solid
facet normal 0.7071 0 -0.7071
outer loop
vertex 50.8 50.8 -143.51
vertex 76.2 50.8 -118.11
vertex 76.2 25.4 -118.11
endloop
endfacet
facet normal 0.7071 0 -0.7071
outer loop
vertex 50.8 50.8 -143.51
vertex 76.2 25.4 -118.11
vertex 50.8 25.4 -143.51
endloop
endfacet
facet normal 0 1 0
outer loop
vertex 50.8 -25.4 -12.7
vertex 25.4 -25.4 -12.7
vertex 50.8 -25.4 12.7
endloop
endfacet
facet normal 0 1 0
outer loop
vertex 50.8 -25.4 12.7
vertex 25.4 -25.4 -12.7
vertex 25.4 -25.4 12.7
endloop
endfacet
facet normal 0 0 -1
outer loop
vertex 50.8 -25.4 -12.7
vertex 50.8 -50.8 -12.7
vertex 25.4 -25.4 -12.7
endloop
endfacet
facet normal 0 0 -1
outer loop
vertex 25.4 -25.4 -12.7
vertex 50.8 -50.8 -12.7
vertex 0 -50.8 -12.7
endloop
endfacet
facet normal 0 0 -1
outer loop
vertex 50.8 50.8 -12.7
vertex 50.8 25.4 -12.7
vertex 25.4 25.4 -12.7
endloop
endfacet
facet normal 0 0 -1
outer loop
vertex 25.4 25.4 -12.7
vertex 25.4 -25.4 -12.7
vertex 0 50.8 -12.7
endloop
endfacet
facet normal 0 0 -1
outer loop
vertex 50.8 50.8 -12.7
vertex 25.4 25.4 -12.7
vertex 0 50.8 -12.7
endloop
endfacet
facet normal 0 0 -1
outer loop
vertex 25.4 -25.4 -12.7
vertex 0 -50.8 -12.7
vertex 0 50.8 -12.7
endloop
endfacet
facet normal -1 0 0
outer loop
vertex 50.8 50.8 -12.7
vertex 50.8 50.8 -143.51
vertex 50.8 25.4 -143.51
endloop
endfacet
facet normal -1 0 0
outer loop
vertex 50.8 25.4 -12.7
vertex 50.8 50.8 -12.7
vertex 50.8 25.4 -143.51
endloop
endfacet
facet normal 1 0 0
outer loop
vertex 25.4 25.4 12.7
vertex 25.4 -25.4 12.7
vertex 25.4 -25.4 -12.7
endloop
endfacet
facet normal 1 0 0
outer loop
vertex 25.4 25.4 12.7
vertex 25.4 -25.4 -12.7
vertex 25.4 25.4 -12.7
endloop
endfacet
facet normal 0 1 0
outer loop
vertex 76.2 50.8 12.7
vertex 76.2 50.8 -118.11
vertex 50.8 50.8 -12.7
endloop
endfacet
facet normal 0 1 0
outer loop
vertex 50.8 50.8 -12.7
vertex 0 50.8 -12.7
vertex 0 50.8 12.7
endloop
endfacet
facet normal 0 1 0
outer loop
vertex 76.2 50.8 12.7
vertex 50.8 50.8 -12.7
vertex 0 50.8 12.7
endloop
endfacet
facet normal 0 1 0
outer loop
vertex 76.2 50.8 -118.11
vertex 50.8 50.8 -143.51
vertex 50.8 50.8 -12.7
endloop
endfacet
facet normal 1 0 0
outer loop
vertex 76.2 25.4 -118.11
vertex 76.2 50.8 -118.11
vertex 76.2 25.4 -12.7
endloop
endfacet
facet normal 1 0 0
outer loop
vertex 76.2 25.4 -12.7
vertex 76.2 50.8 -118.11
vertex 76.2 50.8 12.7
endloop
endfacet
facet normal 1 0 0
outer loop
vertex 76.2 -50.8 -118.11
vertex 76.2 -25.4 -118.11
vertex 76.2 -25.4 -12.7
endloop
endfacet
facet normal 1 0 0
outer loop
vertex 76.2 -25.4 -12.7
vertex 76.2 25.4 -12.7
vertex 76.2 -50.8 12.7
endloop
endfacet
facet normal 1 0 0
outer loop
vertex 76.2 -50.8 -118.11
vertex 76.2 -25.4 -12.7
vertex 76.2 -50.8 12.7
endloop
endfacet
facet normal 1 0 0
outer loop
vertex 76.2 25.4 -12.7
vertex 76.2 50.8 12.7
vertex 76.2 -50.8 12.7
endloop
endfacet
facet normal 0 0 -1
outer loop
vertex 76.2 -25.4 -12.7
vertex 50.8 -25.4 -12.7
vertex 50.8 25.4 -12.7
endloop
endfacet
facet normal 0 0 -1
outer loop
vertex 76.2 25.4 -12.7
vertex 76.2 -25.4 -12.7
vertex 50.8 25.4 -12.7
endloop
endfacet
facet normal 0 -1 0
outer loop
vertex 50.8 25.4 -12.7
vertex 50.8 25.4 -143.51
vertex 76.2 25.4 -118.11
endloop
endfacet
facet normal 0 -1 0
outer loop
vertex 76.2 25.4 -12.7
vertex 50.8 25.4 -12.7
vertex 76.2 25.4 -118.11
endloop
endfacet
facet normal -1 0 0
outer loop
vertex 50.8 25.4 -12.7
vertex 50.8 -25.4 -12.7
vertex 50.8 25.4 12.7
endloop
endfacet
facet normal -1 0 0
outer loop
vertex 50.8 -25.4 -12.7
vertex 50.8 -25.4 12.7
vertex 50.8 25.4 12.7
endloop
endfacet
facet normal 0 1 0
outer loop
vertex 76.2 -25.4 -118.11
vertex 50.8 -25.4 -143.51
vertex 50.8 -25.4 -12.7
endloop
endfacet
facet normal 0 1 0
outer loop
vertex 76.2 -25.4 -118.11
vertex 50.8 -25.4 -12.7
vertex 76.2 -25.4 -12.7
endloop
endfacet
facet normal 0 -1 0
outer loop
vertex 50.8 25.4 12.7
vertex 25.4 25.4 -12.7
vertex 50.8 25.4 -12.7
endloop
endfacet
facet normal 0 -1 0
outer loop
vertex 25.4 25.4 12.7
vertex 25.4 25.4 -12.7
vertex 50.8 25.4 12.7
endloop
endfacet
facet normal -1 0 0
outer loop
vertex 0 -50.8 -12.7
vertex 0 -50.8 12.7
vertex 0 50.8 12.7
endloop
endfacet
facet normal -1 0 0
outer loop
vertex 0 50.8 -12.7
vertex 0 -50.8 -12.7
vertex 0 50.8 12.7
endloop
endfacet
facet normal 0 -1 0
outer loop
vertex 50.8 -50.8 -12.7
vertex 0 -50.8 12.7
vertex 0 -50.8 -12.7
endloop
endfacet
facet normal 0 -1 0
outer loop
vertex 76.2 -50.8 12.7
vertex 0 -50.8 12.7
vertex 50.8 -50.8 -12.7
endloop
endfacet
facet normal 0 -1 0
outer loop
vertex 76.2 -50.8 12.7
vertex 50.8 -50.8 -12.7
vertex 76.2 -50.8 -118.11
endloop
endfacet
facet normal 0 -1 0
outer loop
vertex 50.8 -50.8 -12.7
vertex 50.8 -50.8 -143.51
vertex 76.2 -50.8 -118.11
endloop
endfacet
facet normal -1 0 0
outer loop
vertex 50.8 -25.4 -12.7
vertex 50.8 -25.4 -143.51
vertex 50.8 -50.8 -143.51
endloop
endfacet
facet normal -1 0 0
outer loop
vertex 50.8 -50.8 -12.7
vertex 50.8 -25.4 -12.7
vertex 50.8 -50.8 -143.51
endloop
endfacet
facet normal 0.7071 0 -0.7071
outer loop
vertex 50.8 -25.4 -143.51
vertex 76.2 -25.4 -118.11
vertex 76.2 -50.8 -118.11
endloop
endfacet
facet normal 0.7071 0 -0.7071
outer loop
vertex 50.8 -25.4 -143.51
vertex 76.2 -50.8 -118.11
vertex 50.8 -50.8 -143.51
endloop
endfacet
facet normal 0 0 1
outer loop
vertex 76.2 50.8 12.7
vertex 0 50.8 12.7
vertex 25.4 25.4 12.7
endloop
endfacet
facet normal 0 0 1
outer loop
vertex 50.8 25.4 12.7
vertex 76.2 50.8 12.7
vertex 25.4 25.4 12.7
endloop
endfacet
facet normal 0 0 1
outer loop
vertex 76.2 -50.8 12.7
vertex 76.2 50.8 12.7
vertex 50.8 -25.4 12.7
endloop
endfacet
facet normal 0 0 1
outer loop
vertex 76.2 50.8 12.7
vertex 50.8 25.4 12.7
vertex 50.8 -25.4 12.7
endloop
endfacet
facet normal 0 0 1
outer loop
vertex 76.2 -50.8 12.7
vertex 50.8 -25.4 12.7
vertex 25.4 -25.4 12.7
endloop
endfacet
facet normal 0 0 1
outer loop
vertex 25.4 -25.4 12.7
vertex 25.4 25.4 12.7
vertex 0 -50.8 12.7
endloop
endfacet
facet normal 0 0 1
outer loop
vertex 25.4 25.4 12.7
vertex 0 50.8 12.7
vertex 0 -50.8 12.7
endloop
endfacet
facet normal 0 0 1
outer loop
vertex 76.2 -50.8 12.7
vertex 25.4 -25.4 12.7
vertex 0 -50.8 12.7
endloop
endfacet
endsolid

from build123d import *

# Parameters (mm, degrees)
F0_W        = 101.6
F0_H        = 25.4
F1_DEPTH    = 25.4
F2_W        = 25.4
F2_H        = 25.4
F3_DEPTH    = 25.4
F4_W        = 76.2
F4_H        = 25.4
F4_W_2      = 25.4
F5_DEPTH    = 25.4
F6_W        = 25.4
F6_H        = 25.4
F7_DEPTH    = 156.21
F8_T1_DEPTH = 286.6829915773
F8_T3_DEPTH = 286.6829915773


# Not quite as in the source:
# - a fillet or chamfer that OpenCascade refuses, or shapes differently, is made with other operations: its cross-section is extruded or revolved along the edge and cut away or added


with BuildPart() as f1:
    # F0 (on Right) → F1 (new body)
    with BuildSketch(Plane.YZ):
        Rectangle(F0_W, F0_H)
    extrude(amount=F1_DEPTH)

    # F2 (on face) → F3 (join)
    with BuildSketch(Plane.YZ.offset(25.4)):
        with Locations((38.1, 0)):
            Rectangle(F2_W, F2_H)
        with Locations((-38.1, 0)):
            Rectangle(F2_W, F2_H)
    extrude(amount=F3_DEPTH)

    # F4 (on face) → F5 (join)
    with BuildSketch(Plane.YZ.offset(50.8)):
        with Locations((12.7, 0)):
            Rectangle(F4_W, F4_H)
        with Locations((-38.1, 0)):
            Rectangle(F4_W_2, F4_H)
    extrude(amount=F5_DEPTH)

    # F6 (on face) → F7 (join)
    with BuildSketch(Plane(origin=(0, 0, -12.7), x_dir=(1, 0, 0), z_dir=(0, 0, -1))):
        with Locations((63.5, 38.1)):
            Rectangle(F6_W, F6_H)
        with Locations((63.5, -38.1)):
            Rectangle(F6_W, F6_H)
    extrude(amount=F7_DEPTH)

    # F8: chamfer of 50.8 on 2 edges, made by hand

    # F8_s2 → F8_t1 (cut)
    with BuildSketch(Plane.XZ.offset(-181.4414957887)):
        Polygon((76.2, -118.11), (25.4, -168.91), (76.2, -168.91), align=None)
    extrude(amount=F8_T1_DEPTH, mode=Mode.SUBTRACT)

    # F8_s4 → F8_t3 (cut)
    with BuildSketch(Plane.XZ.offset(-105.2414957887)):
        Polygon((25.4, -168.91), (76.2, -118.11), (76.2, -168.91), align=None)
    extrude(amount=F8_T3_DEPTH, mode=Mode.SUBTRACT)


solid = f1.part
